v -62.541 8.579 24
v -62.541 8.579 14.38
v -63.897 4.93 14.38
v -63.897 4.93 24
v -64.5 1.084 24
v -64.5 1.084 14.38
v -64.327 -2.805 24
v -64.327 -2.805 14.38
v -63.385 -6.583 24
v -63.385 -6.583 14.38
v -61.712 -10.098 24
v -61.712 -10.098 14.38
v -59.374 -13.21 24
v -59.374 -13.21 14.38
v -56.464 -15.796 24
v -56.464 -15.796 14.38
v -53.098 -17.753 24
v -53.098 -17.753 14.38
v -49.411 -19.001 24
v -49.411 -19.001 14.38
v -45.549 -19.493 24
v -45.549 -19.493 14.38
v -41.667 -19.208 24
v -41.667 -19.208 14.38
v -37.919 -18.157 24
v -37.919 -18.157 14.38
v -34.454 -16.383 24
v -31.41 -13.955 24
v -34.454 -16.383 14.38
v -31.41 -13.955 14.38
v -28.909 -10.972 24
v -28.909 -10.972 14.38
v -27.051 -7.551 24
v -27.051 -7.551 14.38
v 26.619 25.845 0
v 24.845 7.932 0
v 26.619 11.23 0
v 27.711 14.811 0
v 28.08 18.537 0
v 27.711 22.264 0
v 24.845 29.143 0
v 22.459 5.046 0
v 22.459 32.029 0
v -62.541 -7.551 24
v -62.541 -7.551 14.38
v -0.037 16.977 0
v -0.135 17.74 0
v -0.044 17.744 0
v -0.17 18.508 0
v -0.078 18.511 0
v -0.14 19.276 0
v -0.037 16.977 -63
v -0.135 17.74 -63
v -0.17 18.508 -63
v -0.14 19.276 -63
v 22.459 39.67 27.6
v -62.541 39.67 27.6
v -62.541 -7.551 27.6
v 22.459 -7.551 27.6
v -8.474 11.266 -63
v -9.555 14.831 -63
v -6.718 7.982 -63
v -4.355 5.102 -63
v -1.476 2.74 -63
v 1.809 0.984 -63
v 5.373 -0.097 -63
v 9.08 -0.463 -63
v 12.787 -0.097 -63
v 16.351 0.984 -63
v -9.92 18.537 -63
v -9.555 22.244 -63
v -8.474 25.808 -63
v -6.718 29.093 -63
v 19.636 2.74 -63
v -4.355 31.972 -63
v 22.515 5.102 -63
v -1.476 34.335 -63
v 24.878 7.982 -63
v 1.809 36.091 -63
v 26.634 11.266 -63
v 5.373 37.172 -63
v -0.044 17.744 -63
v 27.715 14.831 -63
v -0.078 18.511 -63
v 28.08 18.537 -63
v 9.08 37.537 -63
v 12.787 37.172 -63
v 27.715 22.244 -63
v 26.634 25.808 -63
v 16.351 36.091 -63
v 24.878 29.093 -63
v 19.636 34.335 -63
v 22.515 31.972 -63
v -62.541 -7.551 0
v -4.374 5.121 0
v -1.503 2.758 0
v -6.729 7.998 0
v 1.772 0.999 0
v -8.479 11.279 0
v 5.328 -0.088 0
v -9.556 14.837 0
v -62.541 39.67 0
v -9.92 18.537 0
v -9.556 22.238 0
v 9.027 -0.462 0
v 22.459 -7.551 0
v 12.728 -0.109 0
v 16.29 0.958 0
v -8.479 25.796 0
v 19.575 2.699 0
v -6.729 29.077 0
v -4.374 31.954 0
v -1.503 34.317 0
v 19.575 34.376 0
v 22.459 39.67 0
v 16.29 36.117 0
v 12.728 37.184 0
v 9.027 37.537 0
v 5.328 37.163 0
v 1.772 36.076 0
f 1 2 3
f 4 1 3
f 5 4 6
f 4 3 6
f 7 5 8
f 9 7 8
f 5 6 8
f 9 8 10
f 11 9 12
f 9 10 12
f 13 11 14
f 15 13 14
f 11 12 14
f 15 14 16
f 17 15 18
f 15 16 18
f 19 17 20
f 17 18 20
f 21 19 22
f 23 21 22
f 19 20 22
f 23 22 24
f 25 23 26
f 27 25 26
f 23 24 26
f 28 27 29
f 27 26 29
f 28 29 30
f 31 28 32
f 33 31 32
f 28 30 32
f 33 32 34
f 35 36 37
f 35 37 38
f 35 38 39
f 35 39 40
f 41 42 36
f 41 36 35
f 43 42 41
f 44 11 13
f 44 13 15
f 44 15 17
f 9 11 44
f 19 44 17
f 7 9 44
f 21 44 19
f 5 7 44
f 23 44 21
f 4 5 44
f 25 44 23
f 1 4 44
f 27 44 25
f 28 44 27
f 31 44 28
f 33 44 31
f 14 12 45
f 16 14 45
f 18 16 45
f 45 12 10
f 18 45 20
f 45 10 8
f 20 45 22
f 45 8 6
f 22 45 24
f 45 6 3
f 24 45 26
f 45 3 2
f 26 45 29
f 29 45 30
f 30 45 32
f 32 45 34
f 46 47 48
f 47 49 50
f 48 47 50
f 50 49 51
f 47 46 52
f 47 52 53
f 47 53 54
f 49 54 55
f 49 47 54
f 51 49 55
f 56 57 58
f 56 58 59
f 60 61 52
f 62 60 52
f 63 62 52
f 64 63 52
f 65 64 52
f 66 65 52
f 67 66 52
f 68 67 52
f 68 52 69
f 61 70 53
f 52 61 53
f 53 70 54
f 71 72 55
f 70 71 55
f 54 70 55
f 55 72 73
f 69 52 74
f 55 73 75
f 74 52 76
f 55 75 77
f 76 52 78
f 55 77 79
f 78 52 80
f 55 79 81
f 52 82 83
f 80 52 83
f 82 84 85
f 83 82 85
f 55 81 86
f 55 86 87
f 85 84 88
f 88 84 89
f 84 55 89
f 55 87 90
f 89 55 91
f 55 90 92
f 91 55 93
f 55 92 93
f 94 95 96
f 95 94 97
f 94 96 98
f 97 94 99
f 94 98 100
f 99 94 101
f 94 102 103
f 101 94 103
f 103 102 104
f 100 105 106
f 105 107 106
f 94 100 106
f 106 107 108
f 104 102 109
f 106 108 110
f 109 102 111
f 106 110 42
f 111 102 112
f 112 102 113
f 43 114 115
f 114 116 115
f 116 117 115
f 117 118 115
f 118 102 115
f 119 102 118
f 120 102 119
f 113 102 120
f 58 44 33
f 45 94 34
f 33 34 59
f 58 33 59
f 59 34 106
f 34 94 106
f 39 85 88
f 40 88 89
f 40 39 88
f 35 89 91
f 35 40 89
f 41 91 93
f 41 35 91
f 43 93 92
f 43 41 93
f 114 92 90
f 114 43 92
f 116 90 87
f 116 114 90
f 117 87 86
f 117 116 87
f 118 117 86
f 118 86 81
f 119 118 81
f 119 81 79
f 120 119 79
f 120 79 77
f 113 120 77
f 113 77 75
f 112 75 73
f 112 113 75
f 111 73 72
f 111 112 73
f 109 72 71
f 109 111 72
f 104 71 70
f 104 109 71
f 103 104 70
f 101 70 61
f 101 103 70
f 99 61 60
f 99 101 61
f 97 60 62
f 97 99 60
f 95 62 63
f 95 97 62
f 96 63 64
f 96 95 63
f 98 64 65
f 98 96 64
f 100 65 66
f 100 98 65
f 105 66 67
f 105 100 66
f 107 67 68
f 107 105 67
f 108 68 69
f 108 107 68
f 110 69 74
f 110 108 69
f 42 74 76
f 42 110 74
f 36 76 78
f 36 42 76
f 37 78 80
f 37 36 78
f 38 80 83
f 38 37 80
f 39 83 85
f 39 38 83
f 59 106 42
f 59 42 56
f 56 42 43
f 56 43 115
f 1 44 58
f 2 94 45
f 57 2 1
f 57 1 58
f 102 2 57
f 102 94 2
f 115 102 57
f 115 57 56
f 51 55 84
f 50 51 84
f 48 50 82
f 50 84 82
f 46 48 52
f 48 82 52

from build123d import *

# Parameters (mm, degrees)
SKETCH1_R          = 19
EXTRUDE13_DEPTH    = 63
EXTRUDE15_DEPTH    = 17
SKETCH2_R          = 19.5
EXTRUDE18_DEPTH    = 24
SKETCH2_6_R        = 19.5
CUT_EXTRUDE1_DEPTH = 14.38
SKETCH7_W          = 85
SKETCH7_H          = 47.220330203
EXTRUDE21_DEPTH    = 27.6


with BuildPart() as part:
    # Sketch1 → Extrude13 (new body)
    with BuildSketch(Plane.XY):
        with Locations((9.080174701, 18.537445764)):
            Circle(SKETCH1_R)
        with BuildLine():
            ThreePointArc((-0.037230939, 16.976864339), (-0.16055511, 18.123425772), (-0.140259902, 19.276421901))
            ThreePointArc((-0.140259902, 19.276421901), (-0.057438126, 18.128045807), (-0.037230939, 16.976864339))
        make_face(mode=Mode.SUBTRACT)
    extrude(amount=-EXTRUDE13_DEPTH)

    # Sketch1<17> → Extrude15 (add)
    with BuildSketch(Plane.XY):
        with BuildLine():
            ThreePointArc((-0.140259902, 19.276421901), (-0.057438126, 18.128045807), (-0.037230939, 16.976864339))
            ThreePointArc((-0.037230939, 16.976864339), (18.320904513, 18.951465757), (-0.140259902, 19.276421901))
        make_face()
    extrude(amount=EXTRUDE15_DEPTH)



with BuildPart() as body_2:
    # Sketch2 → Extrude18 (new body)
    with BuildSketch(Plane.XY):
        with Locations((-45.03001877, 0)):
            Circle(SKETCH2_R)
    extrude(amount=EXTRUDE18_DEPTH)

    # Sketch2<6> → Cut-Extrude1 (cut)
    with BuildSketch(Plane.XY):
        with Locations((-45.03001877, 0)):
            Circle(SKETCH2_6_R)
    extrude(amount=CUT_EXTRUDE1_DEPTH, mode=Mode.SUBTRACT)


with BuildPart() as part_1:
    add(part.part)

    add(body_2.part)  # Extrude21 merges body 2
    # Sketch7 → Extrude21 (add)
    with BuildSketch(Plane.XY):
        with Locations((-20.041402411, 16.059391911)):
            Rectangle(SKETCH7_W, SKETCH7_H)
    extrude(amount=EXTRUDE21_DEPTH)


solid = part_1.part
